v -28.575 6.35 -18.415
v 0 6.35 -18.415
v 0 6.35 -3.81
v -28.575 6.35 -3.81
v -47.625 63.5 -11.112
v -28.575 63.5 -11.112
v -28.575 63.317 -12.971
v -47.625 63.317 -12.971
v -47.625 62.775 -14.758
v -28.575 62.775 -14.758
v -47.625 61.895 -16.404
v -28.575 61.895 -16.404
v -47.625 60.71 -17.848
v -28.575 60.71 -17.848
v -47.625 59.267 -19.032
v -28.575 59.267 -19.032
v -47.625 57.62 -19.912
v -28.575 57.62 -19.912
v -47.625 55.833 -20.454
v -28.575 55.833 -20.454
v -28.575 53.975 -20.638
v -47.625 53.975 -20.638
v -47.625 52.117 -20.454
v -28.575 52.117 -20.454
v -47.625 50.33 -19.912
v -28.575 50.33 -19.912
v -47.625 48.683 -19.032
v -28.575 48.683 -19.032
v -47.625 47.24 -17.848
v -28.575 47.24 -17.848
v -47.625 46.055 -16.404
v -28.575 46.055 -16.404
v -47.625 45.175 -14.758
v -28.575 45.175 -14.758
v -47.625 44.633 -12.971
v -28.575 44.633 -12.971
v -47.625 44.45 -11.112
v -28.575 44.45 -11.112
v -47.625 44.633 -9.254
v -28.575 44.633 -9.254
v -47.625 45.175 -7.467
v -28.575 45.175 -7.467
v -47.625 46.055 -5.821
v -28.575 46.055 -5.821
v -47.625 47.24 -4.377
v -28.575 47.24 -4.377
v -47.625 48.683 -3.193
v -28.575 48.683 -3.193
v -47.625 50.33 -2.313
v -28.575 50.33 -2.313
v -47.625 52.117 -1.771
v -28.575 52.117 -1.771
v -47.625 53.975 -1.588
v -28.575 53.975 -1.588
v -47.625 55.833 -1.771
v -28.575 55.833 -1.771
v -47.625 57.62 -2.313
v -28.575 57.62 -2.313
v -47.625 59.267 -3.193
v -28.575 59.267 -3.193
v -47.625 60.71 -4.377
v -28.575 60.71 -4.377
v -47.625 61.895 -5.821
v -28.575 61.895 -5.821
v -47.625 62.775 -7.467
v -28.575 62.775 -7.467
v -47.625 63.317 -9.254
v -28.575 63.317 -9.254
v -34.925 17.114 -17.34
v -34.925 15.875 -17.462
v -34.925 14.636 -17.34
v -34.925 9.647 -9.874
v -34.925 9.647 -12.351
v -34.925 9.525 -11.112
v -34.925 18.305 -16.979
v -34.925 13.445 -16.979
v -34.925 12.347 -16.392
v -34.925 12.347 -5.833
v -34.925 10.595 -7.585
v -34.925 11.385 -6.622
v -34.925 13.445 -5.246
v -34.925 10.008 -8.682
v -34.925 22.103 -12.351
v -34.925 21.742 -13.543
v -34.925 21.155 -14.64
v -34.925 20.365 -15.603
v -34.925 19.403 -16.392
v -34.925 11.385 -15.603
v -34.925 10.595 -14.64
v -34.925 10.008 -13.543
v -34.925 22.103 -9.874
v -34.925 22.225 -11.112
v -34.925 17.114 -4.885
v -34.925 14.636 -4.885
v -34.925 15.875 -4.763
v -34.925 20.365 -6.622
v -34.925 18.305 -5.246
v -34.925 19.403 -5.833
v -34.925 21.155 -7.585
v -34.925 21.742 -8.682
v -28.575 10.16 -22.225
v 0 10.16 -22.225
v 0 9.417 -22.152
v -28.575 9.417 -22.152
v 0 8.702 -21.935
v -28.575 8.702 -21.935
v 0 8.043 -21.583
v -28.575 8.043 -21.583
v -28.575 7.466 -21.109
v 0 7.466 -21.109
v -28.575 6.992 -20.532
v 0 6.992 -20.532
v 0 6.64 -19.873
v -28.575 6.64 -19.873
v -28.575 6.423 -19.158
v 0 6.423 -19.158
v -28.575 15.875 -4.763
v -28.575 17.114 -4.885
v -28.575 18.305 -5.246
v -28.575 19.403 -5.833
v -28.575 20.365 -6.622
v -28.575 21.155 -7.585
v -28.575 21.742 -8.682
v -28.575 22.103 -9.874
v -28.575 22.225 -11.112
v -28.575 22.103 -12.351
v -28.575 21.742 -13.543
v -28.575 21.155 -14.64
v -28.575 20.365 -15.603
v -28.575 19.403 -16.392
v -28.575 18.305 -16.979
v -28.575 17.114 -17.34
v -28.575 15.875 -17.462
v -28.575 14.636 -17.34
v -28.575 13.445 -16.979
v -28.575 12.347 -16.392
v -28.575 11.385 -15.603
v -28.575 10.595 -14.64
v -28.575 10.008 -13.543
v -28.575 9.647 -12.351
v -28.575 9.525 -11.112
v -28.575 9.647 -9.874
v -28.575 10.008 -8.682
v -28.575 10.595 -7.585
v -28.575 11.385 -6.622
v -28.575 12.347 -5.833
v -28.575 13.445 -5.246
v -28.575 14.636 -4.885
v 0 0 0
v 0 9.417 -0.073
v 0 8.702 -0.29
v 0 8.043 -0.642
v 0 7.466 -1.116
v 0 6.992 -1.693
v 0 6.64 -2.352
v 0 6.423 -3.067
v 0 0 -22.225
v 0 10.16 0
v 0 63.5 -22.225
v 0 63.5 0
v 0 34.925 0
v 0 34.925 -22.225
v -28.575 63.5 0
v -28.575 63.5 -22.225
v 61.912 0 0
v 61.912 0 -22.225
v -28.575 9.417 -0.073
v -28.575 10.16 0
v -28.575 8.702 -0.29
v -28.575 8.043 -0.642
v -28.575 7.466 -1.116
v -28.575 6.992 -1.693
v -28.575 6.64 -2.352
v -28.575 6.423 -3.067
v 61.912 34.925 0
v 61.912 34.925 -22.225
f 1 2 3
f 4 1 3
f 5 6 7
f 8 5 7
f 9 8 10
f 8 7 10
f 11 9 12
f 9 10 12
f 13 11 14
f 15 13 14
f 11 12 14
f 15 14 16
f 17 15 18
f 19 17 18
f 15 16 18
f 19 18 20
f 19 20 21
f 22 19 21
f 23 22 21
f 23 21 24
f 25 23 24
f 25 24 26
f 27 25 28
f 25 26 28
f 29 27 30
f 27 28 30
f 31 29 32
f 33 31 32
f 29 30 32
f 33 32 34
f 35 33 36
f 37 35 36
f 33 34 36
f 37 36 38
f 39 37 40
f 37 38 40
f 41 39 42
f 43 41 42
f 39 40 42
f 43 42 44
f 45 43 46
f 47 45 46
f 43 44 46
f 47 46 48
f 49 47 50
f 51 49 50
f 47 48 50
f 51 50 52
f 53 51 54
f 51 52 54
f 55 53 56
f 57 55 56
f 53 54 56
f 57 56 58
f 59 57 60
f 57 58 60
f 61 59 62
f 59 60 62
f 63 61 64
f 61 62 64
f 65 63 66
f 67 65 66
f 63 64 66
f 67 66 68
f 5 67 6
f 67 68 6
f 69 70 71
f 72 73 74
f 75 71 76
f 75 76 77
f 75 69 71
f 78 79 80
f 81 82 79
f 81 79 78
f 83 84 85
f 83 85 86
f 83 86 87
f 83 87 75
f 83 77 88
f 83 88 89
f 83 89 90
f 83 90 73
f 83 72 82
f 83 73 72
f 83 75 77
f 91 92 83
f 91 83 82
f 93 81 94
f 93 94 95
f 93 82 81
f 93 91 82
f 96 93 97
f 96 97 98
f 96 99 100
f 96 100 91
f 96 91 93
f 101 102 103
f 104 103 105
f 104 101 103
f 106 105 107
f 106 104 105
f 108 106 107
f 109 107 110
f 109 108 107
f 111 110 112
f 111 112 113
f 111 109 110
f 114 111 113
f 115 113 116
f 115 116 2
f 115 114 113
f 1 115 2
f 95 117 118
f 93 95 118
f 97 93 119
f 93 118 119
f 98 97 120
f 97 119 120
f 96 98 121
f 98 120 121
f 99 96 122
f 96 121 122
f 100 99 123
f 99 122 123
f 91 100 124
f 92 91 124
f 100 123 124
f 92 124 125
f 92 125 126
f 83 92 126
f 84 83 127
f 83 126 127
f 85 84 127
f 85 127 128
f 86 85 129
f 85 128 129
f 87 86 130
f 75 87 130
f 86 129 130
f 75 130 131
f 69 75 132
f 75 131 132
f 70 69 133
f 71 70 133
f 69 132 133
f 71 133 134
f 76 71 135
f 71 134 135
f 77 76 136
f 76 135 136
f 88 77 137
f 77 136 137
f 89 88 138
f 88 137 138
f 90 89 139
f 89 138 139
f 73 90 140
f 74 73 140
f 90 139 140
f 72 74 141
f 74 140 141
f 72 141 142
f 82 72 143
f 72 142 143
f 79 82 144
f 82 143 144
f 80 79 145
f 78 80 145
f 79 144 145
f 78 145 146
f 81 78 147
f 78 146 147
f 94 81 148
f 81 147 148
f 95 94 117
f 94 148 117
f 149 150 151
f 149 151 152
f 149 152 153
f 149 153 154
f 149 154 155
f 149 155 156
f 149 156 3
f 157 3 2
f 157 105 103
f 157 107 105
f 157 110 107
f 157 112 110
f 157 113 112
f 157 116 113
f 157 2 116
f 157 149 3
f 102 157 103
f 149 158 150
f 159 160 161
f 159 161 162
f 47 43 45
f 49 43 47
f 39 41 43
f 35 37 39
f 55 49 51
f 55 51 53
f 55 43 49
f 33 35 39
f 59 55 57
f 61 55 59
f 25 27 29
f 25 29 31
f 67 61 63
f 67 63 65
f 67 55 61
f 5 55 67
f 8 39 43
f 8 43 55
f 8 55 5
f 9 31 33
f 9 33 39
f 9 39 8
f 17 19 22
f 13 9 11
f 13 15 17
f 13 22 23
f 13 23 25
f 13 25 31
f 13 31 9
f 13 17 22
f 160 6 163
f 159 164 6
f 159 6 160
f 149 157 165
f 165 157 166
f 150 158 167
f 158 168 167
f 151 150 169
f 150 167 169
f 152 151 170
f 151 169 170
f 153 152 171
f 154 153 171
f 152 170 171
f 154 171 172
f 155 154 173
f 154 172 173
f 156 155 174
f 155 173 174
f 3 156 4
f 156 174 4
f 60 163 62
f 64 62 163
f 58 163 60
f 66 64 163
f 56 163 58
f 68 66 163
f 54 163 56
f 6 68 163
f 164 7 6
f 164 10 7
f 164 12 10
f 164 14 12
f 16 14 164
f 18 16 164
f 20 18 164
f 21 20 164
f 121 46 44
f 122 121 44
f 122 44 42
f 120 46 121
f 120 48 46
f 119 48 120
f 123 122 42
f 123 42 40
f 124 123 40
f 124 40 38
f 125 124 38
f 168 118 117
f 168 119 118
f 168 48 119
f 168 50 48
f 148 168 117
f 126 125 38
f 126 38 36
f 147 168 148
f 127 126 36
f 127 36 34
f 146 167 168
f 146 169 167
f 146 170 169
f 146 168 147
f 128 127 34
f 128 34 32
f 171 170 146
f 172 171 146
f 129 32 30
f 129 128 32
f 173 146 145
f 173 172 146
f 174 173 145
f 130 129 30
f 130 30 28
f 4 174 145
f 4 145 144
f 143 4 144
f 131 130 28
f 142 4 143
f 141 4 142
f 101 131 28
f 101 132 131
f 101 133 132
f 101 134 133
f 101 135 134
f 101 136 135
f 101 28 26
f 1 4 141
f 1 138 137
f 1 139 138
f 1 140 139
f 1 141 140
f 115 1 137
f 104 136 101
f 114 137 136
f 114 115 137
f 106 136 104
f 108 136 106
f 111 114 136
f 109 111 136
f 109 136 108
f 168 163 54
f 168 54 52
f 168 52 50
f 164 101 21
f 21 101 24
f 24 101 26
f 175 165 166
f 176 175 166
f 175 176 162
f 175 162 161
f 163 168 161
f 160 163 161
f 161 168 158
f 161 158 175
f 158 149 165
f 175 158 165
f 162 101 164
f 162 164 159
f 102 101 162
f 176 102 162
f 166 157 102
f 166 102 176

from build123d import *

# Parameters (mm, degrees)
SKETCH1_W           = 61.9125
SKETCH1_H           = 22.225
BOSS_EXTRUDE1_DEPTH = 34.925
SKETCH2_W           = 22.225
SKETCH2_H           = 28.575
BOSS_EXTRUDE2_DEPTH = 28.575
SKETCH3_W           = 28.575
SKETCH3_H           = 22.225
BOSS_EXTRUDE3_DEPTH = 28.575
SKETCH5_R           = 6.35
BOSS_EXTRUDE5_DEPTH = 6.35
FILLET1_R           = 3.81
SKETCH6_R           = 9.525
BOSS_EXTRUDE6_DEPTH = 19.05


with BuildPart() as part:
    # Sketch1 → Boss-Extrude1 (new body)
    with BuildSketch(Plane(origin=(0, 0, 0), x_dir=(1, 0, 0), z_dir=(0, 1, 0))):
        with Locations((30.95625, 11.1125)):
            Rectangle(SKETCH1_W, SKETCH1_H)
    extrude(amount=BOSS_EXTRUDE1_DEPTH)

    # Sketch2 → Boss-Extrude2 (add)
    with BuildSketch(Plane.ZY):
        with Locations((-11.1125, 20.6375)):
            Rectangle(SKETCH2_W, SKETCH2_H)
    extrude(amount=BOSS_EXTRUDE2_DEPTH)

    # Sketch3 → Boss-Extrude3 (add)
    with BuildSketch(Plane(origin=(0, 34.925, 0), x_dir=(1, 0, 0), z_dir=(0, 1, 0))):
        with Locations((-14.2875, 11.1125)):
            Rectangle(SKETCH3_W, SKETCH3_H)
    extrude(amount=BOSS_EXTRUDE3_DEPTH)

    # Sketch5 → Boss-Extrude5 (add)
    with BuildSketch(Plane.ZY.offset(28.575)):
        with Locations((-11.1125, 15.875)):
            Circle(SKETCH5_R)
    extrude(amount=BOSS_EXTRUDE5_DEPTH)

    # Fillet1
    fillet1_edges = [part.edges().sort_by_distance(p)[0] for p in [
        (-14.2875, 6.35, -22.225),
        (-14.2875, 6.35, 0),
    ]]
    fillet(fillet1_edges, radius=FILLET1_R)

    # Sketch6 → Boss-Extrude6 (add)
    with BuildSketch(Plane.ZY.offset(28.575)):
        with Locations(Location((-11.1125, 53.975, 0), (0, 0, 90))):
            Circle(SKETCH6_R)
    extrude(amount=BOSS_EXTRUDE6_DEPTH)


solid = part.part
